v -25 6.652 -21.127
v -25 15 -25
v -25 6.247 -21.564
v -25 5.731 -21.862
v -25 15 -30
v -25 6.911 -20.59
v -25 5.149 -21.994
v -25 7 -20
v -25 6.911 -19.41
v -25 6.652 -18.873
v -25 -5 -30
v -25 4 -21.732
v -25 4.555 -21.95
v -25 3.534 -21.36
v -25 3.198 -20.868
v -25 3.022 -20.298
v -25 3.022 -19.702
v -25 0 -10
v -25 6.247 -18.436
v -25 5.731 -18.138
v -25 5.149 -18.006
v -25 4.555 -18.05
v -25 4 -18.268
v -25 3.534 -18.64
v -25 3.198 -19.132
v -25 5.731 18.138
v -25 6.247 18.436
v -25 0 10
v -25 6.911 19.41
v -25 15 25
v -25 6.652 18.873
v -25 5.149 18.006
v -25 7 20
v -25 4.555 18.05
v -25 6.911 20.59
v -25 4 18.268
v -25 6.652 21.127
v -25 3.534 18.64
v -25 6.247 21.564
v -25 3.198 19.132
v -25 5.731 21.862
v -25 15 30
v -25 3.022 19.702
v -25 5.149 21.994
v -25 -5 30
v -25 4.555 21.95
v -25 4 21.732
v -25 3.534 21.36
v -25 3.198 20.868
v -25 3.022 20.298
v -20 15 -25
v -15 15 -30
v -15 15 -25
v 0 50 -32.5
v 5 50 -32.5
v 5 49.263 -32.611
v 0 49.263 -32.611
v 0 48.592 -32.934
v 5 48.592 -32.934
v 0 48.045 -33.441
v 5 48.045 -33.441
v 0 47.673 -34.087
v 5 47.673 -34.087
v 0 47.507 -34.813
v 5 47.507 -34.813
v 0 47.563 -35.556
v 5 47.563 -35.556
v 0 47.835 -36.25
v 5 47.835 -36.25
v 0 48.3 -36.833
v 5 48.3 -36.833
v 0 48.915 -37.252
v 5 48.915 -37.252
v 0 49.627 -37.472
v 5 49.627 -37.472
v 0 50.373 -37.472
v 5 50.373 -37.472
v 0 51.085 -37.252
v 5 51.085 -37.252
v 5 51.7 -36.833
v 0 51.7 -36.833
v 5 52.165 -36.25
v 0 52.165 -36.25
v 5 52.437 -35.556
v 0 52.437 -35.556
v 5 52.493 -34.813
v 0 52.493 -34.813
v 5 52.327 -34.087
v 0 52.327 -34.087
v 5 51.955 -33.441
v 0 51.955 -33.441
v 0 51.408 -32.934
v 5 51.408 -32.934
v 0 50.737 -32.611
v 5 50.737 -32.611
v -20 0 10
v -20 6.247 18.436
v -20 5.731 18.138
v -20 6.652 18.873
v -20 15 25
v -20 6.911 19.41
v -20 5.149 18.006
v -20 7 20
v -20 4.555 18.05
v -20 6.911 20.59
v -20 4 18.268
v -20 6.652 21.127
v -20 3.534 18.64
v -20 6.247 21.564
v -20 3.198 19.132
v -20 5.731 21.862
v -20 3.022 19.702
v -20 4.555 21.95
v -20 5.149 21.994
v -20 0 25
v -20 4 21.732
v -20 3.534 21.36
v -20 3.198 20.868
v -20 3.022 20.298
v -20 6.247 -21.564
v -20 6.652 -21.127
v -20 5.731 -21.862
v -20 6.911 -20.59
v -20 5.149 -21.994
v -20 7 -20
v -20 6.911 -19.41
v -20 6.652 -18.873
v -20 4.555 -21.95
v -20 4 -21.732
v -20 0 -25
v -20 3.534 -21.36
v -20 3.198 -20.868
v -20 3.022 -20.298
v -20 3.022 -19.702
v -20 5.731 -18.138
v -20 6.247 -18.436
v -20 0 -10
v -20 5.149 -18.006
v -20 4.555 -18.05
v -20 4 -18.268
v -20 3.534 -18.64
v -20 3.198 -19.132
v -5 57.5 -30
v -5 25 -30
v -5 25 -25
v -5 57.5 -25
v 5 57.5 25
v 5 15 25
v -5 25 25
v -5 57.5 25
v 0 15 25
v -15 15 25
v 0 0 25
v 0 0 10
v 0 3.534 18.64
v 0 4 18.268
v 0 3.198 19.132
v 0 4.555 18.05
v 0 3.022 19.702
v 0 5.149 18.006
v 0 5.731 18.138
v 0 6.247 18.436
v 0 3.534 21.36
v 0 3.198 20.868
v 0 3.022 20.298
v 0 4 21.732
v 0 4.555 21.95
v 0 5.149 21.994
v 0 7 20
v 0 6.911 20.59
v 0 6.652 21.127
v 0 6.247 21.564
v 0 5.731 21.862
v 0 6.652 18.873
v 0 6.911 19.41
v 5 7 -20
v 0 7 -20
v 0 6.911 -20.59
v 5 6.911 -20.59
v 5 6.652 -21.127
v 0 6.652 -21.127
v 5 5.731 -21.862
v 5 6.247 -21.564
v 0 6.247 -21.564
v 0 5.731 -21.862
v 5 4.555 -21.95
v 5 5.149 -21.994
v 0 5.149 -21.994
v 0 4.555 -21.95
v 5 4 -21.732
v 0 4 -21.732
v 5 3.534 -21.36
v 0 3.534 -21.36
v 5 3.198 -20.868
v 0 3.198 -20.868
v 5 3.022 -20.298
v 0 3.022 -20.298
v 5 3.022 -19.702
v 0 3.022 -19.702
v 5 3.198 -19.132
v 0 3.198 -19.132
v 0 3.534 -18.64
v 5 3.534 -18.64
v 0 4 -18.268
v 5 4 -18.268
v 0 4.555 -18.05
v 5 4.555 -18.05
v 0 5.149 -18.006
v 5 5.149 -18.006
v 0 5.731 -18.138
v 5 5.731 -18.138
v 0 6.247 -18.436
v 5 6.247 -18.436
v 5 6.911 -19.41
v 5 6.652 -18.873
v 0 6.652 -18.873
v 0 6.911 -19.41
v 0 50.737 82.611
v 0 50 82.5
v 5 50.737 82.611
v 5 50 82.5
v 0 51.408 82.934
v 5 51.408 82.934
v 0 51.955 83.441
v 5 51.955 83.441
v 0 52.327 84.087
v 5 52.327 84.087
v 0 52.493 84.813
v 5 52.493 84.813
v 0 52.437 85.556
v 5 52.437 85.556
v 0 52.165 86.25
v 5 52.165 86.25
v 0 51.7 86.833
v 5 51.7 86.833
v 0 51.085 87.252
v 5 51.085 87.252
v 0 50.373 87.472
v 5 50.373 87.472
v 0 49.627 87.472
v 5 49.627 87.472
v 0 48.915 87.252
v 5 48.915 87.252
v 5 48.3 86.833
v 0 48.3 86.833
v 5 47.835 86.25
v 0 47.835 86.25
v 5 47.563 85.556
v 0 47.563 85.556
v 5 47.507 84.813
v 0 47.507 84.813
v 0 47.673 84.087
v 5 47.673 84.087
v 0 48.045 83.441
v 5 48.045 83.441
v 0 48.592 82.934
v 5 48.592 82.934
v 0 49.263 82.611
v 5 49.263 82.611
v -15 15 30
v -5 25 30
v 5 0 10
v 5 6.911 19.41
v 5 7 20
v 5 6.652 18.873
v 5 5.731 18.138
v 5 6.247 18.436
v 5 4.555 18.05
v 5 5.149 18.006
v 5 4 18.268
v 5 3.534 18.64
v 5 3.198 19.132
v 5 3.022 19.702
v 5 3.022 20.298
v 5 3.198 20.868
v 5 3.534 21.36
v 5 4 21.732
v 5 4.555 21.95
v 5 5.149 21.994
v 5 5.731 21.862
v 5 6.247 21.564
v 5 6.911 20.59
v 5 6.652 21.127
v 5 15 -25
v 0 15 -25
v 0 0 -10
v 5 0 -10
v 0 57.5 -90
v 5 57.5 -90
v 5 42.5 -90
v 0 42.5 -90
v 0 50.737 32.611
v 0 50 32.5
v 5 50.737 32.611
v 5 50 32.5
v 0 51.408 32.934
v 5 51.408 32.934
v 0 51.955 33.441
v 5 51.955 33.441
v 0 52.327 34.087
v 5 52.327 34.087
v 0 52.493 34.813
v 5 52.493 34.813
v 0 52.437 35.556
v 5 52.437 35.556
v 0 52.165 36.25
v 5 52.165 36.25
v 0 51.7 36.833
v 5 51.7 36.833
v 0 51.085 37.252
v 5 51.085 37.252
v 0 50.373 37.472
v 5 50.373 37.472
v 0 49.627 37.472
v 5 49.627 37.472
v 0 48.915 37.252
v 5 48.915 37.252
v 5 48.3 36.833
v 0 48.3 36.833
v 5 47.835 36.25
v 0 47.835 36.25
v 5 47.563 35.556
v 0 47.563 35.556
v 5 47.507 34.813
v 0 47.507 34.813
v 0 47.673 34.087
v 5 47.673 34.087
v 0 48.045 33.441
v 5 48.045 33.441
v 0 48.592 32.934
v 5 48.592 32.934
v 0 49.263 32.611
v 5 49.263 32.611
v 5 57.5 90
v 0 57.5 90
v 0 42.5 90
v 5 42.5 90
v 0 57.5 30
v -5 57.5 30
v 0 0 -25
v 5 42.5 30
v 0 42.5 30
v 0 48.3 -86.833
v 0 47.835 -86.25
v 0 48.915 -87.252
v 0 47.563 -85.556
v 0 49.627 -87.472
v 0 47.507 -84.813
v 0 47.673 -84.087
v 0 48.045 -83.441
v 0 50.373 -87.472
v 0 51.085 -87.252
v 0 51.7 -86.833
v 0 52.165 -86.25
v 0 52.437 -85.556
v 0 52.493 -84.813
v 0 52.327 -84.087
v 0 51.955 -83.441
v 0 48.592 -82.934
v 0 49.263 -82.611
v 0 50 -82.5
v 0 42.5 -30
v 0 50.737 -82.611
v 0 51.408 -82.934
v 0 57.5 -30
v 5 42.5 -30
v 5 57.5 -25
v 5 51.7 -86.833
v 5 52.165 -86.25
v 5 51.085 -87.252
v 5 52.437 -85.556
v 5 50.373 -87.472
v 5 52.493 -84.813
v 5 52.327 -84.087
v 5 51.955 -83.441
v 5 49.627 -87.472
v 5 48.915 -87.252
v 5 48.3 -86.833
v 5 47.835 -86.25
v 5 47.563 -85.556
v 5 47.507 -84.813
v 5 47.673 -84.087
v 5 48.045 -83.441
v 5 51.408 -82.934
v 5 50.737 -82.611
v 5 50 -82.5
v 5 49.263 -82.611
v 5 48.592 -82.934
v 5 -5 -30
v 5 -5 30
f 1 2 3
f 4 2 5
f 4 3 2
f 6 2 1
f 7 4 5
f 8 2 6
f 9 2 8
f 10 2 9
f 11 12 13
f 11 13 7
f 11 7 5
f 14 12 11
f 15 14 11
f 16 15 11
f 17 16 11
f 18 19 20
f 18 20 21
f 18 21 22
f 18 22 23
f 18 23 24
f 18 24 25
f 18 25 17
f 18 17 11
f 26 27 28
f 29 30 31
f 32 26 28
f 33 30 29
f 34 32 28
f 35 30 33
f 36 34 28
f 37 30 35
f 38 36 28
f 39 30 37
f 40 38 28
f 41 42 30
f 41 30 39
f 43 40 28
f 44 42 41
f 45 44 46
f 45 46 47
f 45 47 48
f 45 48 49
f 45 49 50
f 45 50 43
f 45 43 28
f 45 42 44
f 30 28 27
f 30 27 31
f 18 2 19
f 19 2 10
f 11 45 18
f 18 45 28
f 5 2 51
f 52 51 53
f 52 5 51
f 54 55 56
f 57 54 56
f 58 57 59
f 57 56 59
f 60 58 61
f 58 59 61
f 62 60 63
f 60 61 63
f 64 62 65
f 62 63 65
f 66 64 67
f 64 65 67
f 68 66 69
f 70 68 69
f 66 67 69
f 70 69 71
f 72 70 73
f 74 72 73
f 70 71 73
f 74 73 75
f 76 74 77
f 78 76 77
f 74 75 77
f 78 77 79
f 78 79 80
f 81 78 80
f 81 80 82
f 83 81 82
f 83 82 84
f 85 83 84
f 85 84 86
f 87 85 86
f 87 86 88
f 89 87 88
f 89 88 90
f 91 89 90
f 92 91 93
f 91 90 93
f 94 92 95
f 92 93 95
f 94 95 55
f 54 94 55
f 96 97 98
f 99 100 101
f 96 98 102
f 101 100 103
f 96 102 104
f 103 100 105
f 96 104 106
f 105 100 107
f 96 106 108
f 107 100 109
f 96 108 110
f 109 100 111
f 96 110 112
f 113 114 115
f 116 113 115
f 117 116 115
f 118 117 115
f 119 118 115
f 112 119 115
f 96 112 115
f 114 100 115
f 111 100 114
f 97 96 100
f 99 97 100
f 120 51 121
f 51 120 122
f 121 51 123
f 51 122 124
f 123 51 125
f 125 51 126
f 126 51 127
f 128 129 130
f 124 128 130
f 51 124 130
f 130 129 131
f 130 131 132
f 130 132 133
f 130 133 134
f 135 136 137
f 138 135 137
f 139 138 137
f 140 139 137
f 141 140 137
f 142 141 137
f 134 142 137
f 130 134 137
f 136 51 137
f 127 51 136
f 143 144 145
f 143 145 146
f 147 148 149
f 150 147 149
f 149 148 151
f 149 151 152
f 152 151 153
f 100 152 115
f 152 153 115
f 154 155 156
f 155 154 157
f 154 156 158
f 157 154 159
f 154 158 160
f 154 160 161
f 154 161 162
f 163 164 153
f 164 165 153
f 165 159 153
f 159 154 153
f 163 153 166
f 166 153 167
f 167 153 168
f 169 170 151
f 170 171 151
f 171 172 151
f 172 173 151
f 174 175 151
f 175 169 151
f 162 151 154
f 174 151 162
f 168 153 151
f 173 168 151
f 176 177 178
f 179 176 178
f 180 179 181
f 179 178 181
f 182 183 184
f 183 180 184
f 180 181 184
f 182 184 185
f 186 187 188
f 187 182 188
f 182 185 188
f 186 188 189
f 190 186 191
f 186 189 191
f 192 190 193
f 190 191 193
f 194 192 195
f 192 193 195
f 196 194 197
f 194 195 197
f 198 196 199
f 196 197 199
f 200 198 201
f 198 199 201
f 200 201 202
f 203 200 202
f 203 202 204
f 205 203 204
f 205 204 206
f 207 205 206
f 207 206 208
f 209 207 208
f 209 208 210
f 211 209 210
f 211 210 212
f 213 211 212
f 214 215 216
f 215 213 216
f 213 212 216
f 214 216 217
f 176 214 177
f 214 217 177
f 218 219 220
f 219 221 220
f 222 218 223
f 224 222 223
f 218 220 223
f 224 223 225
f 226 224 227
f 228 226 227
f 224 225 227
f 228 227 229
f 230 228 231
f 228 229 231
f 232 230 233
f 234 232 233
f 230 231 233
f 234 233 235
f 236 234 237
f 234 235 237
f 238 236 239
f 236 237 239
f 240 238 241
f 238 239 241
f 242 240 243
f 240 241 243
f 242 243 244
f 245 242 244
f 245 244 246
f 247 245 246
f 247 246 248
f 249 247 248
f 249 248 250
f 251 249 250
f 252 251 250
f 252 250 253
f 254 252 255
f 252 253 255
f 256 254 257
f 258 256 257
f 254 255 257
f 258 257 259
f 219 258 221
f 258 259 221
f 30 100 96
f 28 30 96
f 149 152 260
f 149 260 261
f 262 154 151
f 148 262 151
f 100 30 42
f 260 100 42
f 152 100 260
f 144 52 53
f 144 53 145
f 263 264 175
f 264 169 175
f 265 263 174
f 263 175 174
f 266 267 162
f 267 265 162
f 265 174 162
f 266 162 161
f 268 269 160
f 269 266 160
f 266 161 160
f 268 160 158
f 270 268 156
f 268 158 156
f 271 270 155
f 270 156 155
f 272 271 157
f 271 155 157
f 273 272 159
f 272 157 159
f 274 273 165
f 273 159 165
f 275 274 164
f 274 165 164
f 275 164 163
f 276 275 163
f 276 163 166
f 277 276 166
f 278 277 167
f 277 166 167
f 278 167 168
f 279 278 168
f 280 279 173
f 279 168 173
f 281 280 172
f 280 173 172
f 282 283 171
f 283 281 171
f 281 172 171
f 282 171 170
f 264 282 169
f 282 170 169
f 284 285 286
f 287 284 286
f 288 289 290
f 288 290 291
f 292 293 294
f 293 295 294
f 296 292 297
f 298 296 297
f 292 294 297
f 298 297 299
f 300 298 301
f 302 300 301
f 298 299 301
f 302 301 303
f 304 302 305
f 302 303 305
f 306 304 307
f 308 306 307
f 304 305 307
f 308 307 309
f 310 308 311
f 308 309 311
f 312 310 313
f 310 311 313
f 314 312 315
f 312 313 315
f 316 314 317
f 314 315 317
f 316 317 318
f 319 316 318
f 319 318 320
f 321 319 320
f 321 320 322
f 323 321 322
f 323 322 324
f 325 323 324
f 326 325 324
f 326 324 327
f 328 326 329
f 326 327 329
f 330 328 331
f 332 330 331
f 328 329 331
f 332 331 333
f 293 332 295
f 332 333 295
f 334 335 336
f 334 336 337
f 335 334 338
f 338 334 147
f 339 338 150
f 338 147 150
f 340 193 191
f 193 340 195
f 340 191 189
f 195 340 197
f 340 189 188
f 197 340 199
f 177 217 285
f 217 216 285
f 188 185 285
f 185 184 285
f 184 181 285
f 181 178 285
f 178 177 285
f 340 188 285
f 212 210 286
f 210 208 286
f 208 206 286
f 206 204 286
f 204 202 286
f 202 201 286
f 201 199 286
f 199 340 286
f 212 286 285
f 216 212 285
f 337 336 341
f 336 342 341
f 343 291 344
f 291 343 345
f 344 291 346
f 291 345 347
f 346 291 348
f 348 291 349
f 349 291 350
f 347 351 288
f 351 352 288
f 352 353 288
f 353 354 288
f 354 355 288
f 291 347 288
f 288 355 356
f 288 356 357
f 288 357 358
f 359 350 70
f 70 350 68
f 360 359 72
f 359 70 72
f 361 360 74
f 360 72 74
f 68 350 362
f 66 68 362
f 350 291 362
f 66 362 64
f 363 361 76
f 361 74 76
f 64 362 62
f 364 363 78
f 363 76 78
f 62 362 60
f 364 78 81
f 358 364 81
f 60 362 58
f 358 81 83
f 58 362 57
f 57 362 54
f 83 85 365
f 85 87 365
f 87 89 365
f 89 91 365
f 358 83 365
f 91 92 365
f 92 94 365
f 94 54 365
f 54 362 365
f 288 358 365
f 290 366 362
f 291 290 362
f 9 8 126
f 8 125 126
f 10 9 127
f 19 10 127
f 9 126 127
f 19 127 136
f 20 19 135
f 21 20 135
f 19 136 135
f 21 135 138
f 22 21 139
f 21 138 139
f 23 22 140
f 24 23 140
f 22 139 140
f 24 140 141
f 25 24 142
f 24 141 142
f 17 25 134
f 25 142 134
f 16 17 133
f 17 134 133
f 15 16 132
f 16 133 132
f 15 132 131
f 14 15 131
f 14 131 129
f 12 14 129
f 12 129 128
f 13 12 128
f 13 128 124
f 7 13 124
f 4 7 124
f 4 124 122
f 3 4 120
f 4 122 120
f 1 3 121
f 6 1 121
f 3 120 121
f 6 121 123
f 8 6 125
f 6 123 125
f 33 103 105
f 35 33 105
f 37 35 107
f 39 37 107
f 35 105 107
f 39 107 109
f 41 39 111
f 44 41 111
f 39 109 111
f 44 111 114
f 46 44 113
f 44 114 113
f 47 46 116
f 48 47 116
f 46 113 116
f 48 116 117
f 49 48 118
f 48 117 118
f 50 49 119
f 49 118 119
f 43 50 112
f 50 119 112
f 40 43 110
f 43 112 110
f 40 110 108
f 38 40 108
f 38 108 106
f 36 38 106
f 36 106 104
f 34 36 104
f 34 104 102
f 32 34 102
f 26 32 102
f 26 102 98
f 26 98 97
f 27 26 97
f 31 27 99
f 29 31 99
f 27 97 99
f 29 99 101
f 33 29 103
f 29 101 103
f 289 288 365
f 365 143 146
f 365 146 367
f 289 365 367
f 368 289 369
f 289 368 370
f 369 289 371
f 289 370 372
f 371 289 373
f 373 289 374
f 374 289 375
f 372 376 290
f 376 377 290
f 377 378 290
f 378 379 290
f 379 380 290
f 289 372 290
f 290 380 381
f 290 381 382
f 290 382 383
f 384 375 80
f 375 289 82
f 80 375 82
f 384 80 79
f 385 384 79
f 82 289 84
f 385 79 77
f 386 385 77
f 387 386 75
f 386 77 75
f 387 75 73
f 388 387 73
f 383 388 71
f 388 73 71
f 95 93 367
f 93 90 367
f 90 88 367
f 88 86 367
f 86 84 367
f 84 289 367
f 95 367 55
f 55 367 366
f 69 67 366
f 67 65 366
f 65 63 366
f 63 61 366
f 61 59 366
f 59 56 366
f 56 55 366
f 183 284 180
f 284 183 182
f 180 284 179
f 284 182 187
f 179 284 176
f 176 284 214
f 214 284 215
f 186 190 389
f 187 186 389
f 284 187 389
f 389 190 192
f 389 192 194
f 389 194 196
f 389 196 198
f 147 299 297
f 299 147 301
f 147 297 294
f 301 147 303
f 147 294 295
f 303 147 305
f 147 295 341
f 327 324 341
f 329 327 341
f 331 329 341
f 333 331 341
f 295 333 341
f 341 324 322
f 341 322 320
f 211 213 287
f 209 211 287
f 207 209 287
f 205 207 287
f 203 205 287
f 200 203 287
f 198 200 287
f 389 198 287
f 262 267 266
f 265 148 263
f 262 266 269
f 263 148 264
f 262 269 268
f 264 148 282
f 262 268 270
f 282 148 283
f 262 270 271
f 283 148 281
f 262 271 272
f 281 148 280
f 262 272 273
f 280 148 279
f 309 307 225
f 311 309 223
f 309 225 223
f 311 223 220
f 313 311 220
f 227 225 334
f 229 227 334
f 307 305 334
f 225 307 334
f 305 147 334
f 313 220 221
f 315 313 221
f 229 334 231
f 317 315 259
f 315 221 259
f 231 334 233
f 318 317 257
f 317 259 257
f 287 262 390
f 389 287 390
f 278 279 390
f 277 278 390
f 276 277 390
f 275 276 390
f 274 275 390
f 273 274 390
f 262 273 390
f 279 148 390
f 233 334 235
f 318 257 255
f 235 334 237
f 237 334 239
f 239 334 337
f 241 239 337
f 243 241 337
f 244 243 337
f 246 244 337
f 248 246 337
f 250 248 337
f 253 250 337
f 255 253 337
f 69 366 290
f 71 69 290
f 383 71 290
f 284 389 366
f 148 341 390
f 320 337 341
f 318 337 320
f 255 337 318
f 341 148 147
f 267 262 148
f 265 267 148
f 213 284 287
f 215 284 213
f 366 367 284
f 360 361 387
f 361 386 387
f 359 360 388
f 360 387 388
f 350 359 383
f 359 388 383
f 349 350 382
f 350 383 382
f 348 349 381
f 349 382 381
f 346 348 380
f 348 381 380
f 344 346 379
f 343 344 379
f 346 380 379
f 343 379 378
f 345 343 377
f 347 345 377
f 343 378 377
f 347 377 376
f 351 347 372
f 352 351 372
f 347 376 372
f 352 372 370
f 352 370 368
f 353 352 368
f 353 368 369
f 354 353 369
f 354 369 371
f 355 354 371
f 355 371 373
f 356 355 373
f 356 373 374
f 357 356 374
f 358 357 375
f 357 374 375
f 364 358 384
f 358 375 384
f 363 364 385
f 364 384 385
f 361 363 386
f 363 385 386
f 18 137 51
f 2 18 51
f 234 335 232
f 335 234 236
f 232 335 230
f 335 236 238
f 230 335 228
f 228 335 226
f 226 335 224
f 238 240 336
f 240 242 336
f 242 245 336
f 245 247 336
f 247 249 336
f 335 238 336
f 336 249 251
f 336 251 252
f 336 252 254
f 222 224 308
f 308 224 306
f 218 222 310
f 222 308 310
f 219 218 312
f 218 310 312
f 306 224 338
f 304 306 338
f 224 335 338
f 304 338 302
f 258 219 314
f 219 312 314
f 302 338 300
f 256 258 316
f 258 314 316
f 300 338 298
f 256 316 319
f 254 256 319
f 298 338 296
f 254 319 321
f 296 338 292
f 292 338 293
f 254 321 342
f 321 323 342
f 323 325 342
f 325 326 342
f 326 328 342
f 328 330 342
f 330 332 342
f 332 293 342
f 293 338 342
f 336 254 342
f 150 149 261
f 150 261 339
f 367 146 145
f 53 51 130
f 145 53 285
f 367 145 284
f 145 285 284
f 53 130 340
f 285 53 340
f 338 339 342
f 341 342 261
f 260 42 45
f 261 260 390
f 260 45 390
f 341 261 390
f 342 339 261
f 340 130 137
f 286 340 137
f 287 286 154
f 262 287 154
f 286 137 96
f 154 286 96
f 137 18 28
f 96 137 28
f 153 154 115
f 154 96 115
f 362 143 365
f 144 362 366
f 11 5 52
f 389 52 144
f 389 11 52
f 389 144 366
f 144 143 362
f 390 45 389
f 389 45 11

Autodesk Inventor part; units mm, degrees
ref_plane "YZ Plane" through (0, 0, 0) normal (1, 0, 0) x (0, 1, 0)
ref_plane "XZ Plane" through (0, 0, 0) normal (0, 1, 0) x (-1, 0, 0)
ref_plane "XY Plane" through (0, 0, 0) normal (0, 0, 1) x (1, 0, 0)
sketch "Sketch1" plane through (0, 0, 0) normal (1, 0, 0) x (0, 1, 0)
  line L0 (15, 25) -> (-5, 25)
  line L1 (-5, 25) -> (-5, -25)
  line L2 (-5, -25) -> (15, -25)
  line L3 (15, -25) -> (0, -10)
  line L4 (0, -10) -> (0, 10)
  line L5 (0, 10) -> (15, 25)
  line L6 (0, 0) -> (-5, 0) construction
  circle A0 centre (5, -20) radius 2
  circle A1 centre (5, 20) radius 2
  dimension "d0" = 50
  dimension "d1" = 45
  dimension "d2" = 5
  dimension "d4" = 40
  dimension "d5" = 4
  dimension "d6" = 20
  dimension "d7" = 5
  dimension "d8" = 15
extrude "Extrusion1" add sketch "Sketch1" along normal blind 5
sketch "Sketch2" plane through (0, 0, 0) normal (-1, 0, 0) x (0, 0, 1)
  line L0 (25, -5) -> (-25, -5) projected
  line L1 (-25, -5) -> (25, -5)
  line L2 (25, -5) -> (25, 0)
  line L3 (25, 0) -> (-25, 0)
  line L4 (-25, 0) -> (-25, -5)
  point P0 (0, 0)
extrude "Extrusion2" add sketch "Sketch2" along normal blind 10
mirror "Mirror1" about plane through (-10, -2.5, 0) normal (-1, 0, 0)
sketch "Sketch5" plane through (5, -5, -25) normal (0, -1, 0) x (1, 0, 0)
  line L0 (0, 50) -> (0, 0) construction
  line L1 (0, 50) -> (-30, 50)
  line L2 (-30, 50) -> (-30, 55)
  line L3 (-30, 55) -> (0, 55)
  line L4 (0, 55) -> (0, 50)
  line L5 (-30, 0) -> (0, 0) projected
  line L6 (0, 0) -> (-30, 0)
  line L7 (-30, 0) -> (-30, -5)
  line L8 (-30, -5) -> (0, -5)
  line L9 (0, -5) -> (0, 0)
  line L10 (-30, 50) -> (-30, 0) construction
  point P0 (-5, 25)
  dimension "d19" = 5
extrude "Extrusion5" add sketch "Sketch5" against normal blind 62.5
sketch "Sketch6" plane through (-25, -5, 30) normal (0, 0, 1) x (1, 0, 0)
  line L0 (30, 62.5) -> (25, 62.5)
  line L1 (25, 62.5) -> (25, 47.5)
  line L2 (25, 47.5) -> (30, 47.5)
  line L3 (30, 47.5) -> (30, 62.5)
  line L4 (30, 0) -> (30, 62.5) construction
  dimension "d25" = 5
  dimension "d26" = 15
extrude "Extrusion6" add sketch "Sketch6" along normal blind 60
sketch "Sketch8" plane through (5, 0, 0) normal (1, 0, 0) x (0, 0, -1)
  line L0 (-30, 42.5) -> (-30, 57.5) construction
  line L1 (-30, 50) -> (-90, 50) construction
  line L2 (-90, 42.5) -> (-90, 57.5) construction
  circle A0 centre (-85, 50) radius 2.5
  circle A1 centre (-35, 50) radius 2.5
  point P0 (0, 0)
  dimension "d31" = 5
  dimension "d32" = 5
  dimension "d33" = 5
extrude "Extrusion8" cut sketch "Sketch8" against normal blind 10
mirror "Mirror2" about plane through (0, 0, 0) normal (0, 0, 1) of "Extrusion6", "Extrusion8"
sketch "Sketch7" plane through (-25, -5, 30) normal (0, 0, 1) x (1, 0, 0)
  line L0 (0, 62.5) -> (25, 62.5) construction
  line L1 (0, 0) -> (0, 62.5) construction
  line L2 (0, 62.5) -> (0, 20)
  line L3 (0, 20) -> (0, 62.5) projected
  line L4 (0, 20) -> (10, 20)
  line L5 (10, 20) -> (20, 30)
  line L6 (0, 20) -> (0, 62.5) projected
  line L7 (0, 62.5) -> (20, 62.5)
  line L8 (20, 30) -> (20, 62.5)
  line L9 (30, 62.5) -> (0, 62.5) construction
  line L10 (25, 47.5) -> (25, 62.5) projected
  point P0 (25, 5)
  dimension "d38" = 5
  dimension "d39" = 45
  dimension "d40" = 10
extrude "Extrusion7" cut sketch "Sketch7" along normal through all both and the other way through all
sketch "Sketch3" plane through (0, 0, 10) normal (0, 1, 0) x (1, 0, 0)
  line L0 (-20, 0) -> (-20, -15) construction
  line L1 (0, 20) -> (5, 20) construction
  line L2 (-20, 0) -> (0, 20) construction
  line L3 (-20, 35) -> (-20, 20) construction
  line L4 (0, 0) -> (5, 0) construction
  line L5 (-20, 20) -> (0, 0) construction
  circle A0 centre (-10, 10) radius 3
  point P0 (0, 10)
  dimension "d13" = 6
sketch "Sketch4" plane through (0, 0, 10) normal (0, 1, 0) x (1, 0, 0)
  circle A0 centre (-10, 10) radius 3 projected
  circle A1 centre (-10, 10) radius 2
  point P0 (0, 10)
  dimension "d16" = 4
equation "\"d6\" = 0.5 * d4"
equation "\"d7\" = 0.333333 * d8"
properties part number "upper fan mount"
